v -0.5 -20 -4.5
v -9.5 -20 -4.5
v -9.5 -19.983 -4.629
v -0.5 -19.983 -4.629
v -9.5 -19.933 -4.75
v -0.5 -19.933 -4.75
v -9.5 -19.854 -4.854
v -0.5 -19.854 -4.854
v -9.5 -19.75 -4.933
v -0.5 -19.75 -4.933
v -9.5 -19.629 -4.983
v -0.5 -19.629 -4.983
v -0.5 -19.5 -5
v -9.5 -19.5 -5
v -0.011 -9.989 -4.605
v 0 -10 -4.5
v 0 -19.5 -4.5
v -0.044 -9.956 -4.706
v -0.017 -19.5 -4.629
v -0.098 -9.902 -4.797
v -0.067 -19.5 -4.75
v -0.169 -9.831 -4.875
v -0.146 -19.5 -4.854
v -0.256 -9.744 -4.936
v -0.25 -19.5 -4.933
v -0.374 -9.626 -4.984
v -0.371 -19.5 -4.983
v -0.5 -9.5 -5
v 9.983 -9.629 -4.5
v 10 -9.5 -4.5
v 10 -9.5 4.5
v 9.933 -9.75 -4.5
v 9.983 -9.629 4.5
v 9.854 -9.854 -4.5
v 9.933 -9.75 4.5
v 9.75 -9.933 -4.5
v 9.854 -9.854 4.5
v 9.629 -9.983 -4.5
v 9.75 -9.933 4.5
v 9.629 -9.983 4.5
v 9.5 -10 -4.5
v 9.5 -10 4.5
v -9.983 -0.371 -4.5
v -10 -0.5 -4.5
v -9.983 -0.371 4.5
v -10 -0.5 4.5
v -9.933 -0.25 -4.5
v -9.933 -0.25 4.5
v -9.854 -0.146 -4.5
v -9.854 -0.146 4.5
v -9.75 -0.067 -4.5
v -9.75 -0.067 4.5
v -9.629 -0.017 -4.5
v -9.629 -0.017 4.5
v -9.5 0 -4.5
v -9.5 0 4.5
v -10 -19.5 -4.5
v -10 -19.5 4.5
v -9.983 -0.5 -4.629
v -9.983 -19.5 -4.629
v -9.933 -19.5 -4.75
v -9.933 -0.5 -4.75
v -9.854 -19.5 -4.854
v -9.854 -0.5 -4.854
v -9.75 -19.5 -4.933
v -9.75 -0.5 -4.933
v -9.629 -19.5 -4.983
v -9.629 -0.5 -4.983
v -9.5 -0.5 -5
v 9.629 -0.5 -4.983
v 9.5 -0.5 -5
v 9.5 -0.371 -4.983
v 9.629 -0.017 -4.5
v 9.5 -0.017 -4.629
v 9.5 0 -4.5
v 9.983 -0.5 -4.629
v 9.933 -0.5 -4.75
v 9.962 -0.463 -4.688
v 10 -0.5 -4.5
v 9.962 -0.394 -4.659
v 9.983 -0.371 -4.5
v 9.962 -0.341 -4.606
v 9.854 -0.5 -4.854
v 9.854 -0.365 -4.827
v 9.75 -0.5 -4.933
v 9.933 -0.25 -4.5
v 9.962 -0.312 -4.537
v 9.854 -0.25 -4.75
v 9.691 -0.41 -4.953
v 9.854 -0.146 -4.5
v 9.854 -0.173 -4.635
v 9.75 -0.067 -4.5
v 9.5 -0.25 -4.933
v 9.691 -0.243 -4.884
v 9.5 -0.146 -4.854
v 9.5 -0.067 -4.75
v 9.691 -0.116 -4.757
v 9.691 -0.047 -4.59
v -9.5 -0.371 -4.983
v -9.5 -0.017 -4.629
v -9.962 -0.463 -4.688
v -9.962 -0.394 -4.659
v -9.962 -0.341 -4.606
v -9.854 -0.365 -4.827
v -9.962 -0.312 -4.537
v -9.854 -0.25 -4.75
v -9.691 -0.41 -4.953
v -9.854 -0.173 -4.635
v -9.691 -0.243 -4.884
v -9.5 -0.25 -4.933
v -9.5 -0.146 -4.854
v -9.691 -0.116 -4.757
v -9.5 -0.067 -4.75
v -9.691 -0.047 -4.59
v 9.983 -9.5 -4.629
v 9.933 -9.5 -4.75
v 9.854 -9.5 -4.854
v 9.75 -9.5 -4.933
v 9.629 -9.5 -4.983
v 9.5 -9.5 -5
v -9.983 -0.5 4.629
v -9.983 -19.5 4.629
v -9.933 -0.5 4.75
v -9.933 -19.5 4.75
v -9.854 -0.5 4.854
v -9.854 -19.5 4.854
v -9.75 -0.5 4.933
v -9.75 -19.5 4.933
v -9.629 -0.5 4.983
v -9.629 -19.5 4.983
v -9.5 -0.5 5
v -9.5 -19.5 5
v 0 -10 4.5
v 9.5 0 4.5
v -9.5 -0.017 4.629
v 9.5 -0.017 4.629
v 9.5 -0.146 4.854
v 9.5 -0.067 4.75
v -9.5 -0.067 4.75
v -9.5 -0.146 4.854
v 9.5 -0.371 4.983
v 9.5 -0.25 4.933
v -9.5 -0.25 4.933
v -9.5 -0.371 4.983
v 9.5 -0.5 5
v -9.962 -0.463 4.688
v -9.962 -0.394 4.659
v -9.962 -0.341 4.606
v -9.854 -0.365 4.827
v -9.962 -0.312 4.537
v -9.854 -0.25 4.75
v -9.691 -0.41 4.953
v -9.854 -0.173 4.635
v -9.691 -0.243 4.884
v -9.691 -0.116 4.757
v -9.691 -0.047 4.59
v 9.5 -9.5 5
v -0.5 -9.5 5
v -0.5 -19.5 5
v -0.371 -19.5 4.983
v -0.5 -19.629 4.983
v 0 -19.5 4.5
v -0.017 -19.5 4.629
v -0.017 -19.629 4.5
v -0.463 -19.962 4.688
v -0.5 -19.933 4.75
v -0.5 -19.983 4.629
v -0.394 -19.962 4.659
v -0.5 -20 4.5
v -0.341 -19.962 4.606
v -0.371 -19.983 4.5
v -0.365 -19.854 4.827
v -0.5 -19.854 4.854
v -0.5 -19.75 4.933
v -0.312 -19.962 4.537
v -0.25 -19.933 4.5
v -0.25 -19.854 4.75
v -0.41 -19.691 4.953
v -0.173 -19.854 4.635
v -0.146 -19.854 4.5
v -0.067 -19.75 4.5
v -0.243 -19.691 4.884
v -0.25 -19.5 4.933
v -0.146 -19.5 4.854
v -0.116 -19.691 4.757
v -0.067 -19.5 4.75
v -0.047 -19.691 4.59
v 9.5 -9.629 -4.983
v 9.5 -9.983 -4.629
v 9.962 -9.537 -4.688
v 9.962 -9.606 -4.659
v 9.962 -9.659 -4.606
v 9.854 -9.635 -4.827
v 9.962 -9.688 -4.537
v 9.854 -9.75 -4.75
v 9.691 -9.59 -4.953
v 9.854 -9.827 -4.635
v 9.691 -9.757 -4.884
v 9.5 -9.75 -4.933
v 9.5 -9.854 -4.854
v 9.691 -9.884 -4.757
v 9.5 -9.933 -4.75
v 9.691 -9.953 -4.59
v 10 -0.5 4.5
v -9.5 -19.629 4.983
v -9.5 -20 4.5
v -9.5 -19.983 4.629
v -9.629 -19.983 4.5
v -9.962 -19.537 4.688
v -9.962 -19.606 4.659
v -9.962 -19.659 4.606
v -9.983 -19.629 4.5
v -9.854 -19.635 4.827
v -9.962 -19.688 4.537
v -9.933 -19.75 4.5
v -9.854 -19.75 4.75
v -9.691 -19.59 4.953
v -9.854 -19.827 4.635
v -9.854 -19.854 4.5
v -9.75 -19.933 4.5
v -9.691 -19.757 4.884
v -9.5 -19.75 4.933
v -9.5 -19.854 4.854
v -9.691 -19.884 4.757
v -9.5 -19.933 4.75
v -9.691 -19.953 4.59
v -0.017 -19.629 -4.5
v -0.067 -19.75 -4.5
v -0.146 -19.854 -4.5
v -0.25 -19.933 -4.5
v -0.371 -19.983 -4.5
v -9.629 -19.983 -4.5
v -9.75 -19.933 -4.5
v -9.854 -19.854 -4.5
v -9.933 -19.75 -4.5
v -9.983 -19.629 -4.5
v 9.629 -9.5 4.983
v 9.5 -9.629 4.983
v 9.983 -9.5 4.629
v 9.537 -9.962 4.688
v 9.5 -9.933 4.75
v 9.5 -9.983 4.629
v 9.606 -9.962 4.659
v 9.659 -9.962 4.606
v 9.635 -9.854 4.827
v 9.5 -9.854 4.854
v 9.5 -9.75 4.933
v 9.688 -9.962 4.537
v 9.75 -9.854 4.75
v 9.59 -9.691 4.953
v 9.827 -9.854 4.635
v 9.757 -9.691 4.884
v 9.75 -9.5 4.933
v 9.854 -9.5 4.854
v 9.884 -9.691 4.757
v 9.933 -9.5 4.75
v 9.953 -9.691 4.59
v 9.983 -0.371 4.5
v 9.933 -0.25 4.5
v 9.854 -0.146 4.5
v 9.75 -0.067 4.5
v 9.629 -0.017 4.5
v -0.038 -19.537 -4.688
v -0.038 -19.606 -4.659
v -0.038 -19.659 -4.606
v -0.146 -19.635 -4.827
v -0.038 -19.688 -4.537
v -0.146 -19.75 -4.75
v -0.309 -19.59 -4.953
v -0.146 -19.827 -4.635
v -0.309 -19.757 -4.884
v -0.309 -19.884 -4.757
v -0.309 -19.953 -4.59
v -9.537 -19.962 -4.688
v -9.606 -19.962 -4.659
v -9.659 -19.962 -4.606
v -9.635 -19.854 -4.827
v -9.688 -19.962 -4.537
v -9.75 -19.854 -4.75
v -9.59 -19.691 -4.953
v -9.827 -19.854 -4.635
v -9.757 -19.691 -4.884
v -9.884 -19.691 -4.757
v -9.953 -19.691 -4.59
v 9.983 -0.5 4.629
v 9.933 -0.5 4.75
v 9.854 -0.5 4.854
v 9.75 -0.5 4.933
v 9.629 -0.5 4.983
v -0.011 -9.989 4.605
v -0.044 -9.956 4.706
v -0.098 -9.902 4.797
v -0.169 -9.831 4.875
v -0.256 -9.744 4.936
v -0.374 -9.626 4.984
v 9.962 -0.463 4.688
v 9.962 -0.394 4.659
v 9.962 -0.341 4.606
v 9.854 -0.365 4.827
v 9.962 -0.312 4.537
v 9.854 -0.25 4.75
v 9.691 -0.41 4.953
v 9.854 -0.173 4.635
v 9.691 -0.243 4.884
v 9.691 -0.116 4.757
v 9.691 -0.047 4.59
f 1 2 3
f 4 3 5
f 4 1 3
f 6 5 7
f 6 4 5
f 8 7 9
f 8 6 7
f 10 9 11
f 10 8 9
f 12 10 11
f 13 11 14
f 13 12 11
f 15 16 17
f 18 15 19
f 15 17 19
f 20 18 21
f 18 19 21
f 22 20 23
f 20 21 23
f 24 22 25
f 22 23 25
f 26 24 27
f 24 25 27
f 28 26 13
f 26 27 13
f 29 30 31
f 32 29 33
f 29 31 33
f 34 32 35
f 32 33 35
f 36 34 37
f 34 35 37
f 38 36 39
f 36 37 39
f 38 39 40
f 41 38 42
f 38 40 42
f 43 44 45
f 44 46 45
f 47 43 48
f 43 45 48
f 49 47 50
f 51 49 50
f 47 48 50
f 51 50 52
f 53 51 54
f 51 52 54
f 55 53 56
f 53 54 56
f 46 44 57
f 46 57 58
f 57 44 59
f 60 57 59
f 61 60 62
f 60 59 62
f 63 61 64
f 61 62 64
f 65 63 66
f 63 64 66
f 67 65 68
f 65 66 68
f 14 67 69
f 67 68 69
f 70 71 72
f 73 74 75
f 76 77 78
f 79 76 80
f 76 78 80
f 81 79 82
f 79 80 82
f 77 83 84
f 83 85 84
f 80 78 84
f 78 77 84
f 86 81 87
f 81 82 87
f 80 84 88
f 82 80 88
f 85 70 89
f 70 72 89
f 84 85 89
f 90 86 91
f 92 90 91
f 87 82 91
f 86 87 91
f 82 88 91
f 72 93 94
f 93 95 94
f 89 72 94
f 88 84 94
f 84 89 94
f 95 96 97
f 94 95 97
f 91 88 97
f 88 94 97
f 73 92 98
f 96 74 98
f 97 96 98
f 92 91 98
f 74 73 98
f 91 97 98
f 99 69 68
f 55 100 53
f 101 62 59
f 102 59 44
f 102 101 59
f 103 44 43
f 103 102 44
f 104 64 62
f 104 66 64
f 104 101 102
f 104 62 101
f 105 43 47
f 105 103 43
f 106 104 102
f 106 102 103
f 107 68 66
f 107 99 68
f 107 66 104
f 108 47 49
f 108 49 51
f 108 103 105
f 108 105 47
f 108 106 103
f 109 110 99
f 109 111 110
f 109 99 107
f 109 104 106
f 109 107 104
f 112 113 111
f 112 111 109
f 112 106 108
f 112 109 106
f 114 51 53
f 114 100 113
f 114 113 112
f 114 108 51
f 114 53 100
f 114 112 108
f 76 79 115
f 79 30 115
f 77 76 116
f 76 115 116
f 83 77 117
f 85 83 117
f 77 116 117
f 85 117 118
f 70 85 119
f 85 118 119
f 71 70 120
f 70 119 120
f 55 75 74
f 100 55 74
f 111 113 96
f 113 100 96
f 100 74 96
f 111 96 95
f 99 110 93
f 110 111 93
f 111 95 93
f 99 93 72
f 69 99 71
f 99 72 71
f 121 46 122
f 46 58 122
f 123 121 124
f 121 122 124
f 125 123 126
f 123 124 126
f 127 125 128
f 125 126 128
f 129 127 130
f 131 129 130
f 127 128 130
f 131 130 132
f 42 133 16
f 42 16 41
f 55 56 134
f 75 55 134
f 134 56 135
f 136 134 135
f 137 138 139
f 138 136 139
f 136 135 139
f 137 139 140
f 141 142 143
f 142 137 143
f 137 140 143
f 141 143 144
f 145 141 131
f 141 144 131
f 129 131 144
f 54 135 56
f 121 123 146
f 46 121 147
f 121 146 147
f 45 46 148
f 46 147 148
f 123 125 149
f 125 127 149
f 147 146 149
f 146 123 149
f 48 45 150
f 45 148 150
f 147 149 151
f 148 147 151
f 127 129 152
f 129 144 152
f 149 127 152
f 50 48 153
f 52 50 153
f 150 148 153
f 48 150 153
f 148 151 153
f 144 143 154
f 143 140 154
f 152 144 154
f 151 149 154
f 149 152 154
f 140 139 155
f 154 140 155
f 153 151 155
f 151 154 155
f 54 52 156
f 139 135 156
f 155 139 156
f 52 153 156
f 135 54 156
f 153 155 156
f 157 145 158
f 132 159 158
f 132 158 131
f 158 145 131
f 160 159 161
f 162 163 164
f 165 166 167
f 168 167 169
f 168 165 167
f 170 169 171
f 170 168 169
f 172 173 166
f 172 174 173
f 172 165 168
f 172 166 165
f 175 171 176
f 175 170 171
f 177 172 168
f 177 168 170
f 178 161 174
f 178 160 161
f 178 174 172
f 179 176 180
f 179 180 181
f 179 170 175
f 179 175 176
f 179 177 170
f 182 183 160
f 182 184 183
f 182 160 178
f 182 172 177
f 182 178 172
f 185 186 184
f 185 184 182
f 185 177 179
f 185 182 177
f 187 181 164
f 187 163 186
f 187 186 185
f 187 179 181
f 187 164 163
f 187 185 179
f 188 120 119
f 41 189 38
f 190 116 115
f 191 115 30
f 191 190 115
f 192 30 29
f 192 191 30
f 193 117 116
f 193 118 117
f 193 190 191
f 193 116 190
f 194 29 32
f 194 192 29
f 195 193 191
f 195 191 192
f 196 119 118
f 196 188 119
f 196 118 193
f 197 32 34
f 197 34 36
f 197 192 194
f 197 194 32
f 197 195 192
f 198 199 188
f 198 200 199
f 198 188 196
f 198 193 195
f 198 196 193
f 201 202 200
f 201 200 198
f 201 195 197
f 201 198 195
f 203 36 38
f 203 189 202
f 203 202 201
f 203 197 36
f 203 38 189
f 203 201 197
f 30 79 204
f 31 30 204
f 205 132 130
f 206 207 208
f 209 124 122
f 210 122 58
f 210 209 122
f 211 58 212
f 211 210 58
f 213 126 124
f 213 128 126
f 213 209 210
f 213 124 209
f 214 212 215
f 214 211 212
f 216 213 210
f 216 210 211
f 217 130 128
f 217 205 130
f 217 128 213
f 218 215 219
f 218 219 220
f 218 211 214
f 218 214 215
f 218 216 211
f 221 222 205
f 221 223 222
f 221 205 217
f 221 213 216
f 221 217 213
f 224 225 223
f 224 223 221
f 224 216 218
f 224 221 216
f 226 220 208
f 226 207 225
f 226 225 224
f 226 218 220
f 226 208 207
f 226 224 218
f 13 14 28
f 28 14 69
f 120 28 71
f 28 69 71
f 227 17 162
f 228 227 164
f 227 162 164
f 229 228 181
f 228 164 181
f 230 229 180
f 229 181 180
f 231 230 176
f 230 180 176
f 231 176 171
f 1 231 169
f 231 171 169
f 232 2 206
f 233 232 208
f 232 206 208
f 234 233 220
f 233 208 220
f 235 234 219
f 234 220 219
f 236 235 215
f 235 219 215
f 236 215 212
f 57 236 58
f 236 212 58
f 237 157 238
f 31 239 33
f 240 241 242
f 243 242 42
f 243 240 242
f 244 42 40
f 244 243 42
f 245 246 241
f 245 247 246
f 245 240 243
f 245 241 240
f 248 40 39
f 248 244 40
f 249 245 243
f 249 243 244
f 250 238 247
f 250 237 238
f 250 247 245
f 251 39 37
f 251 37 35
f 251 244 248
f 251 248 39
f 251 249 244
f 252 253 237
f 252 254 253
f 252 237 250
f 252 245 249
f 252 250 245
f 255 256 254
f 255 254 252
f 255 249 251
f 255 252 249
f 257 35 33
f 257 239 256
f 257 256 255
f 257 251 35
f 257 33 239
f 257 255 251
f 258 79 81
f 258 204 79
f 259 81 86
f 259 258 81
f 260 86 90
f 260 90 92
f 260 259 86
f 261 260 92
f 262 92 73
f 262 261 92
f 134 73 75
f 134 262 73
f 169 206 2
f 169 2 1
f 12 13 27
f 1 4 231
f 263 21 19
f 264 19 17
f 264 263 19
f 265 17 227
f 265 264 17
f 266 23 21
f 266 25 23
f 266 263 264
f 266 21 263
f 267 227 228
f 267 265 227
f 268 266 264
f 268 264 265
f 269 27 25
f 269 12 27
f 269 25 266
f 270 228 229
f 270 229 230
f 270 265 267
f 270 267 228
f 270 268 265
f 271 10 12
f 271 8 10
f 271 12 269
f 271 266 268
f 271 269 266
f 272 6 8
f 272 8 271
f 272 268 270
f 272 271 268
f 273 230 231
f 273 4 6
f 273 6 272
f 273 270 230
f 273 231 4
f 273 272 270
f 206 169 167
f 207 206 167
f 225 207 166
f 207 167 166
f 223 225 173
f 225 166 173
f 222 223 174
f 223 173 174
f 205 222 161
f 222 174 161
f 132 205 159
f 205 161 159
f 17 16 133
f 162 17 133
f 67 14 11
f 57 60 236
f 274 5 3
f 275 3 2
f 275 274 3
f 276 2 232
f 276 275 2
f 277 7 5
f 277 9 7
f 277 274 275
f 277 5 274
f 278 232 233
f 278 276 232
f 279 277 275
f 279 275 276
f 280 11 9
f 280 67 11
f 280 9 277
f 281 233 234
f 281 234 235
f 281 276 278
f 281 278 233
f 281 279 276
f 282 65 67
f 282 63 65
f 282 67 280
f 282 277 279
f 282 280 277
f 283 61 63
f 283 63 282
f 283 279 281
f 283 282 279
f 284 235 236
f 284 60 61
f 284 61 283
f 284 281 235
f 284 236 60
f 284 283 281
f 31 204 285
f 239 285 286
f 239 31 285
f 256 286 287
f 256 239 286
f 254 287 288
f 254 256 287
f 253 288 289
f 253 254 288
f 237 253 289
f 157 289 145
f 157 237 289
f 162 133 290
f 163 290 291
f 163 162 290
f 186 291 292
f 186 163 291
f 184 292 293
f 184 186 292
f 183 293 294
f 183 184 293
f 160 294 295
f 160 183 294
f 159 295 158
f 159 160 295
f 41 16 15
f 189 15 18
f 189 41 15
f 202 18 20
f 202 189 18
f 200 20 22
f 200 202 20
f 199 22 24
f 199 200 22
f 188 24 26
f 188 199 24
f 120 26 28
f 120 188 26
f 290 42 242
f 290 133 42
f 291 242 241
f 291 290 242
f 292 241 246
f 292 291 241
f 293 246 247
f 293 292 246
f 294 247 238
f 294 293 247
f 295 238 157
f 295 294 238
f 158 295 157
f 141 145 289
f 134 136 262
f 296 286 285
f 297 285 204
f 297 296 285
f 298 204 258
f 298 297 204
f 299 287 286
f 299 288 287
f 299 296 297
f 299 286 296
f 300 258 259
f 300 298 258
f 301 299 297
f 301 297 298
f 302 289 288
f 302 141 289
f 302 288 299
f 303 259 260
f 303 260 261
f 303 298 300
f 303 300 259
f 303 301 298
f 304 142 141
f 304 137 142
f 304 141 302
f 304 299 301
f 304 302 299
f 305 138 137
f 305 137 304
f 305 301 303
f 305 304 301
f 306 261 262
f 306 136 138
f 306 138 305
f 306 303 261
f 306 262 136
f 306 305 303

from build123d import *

# Parameters (mm, degrees)
F0_W     = 10
F0_H     = 10
F1_DEPTH = 20
F2_DEPTH = 10
F3_R     = 0.5


with BuildPart() as f1:
    # F0 (on Front) → F1 (new body)
    with BuildSketch(Plane.XZ):
        with Locations((-5, 0)):
            Rectangle(F0_W, F0_H)
    extrude(amount=F1_DEPTH)

    # F0 (on Front) → F2 (join)
    with BuildSketch(Plane.XZ):
        with Locations((5, 0)):
            Rectangle(F0_W, F0_H)
        with Locations((-5, 0)):
            Rectangle(F0_W, F0_H)
    extrude(amount=F2_DEPTH)

    # F3
    f3_edges = [f1.edges().sort_by_distance(p)[0] for p in [
        (0, 0, 5),
        (10, -5, 5),
        (5, -10, 5),
        (0, -15, 5),
        (-5, -20, 5),
        (-10, -10, 5),
        (0, 0, -5),
        (-10, -10, -5),
        (-5, -20, -5),
        (0, -15, -5),
        (5, -10, -5),
        (10, -5, -5),
        (10, 0, 0),
        (-10, 0, 0),
        (0, -20, 0),
        (-10, -20, 0),
        (10, -10, 0),
    ]]
    fillet(f3_edges, radius=F3_R)


solid = f1.part
